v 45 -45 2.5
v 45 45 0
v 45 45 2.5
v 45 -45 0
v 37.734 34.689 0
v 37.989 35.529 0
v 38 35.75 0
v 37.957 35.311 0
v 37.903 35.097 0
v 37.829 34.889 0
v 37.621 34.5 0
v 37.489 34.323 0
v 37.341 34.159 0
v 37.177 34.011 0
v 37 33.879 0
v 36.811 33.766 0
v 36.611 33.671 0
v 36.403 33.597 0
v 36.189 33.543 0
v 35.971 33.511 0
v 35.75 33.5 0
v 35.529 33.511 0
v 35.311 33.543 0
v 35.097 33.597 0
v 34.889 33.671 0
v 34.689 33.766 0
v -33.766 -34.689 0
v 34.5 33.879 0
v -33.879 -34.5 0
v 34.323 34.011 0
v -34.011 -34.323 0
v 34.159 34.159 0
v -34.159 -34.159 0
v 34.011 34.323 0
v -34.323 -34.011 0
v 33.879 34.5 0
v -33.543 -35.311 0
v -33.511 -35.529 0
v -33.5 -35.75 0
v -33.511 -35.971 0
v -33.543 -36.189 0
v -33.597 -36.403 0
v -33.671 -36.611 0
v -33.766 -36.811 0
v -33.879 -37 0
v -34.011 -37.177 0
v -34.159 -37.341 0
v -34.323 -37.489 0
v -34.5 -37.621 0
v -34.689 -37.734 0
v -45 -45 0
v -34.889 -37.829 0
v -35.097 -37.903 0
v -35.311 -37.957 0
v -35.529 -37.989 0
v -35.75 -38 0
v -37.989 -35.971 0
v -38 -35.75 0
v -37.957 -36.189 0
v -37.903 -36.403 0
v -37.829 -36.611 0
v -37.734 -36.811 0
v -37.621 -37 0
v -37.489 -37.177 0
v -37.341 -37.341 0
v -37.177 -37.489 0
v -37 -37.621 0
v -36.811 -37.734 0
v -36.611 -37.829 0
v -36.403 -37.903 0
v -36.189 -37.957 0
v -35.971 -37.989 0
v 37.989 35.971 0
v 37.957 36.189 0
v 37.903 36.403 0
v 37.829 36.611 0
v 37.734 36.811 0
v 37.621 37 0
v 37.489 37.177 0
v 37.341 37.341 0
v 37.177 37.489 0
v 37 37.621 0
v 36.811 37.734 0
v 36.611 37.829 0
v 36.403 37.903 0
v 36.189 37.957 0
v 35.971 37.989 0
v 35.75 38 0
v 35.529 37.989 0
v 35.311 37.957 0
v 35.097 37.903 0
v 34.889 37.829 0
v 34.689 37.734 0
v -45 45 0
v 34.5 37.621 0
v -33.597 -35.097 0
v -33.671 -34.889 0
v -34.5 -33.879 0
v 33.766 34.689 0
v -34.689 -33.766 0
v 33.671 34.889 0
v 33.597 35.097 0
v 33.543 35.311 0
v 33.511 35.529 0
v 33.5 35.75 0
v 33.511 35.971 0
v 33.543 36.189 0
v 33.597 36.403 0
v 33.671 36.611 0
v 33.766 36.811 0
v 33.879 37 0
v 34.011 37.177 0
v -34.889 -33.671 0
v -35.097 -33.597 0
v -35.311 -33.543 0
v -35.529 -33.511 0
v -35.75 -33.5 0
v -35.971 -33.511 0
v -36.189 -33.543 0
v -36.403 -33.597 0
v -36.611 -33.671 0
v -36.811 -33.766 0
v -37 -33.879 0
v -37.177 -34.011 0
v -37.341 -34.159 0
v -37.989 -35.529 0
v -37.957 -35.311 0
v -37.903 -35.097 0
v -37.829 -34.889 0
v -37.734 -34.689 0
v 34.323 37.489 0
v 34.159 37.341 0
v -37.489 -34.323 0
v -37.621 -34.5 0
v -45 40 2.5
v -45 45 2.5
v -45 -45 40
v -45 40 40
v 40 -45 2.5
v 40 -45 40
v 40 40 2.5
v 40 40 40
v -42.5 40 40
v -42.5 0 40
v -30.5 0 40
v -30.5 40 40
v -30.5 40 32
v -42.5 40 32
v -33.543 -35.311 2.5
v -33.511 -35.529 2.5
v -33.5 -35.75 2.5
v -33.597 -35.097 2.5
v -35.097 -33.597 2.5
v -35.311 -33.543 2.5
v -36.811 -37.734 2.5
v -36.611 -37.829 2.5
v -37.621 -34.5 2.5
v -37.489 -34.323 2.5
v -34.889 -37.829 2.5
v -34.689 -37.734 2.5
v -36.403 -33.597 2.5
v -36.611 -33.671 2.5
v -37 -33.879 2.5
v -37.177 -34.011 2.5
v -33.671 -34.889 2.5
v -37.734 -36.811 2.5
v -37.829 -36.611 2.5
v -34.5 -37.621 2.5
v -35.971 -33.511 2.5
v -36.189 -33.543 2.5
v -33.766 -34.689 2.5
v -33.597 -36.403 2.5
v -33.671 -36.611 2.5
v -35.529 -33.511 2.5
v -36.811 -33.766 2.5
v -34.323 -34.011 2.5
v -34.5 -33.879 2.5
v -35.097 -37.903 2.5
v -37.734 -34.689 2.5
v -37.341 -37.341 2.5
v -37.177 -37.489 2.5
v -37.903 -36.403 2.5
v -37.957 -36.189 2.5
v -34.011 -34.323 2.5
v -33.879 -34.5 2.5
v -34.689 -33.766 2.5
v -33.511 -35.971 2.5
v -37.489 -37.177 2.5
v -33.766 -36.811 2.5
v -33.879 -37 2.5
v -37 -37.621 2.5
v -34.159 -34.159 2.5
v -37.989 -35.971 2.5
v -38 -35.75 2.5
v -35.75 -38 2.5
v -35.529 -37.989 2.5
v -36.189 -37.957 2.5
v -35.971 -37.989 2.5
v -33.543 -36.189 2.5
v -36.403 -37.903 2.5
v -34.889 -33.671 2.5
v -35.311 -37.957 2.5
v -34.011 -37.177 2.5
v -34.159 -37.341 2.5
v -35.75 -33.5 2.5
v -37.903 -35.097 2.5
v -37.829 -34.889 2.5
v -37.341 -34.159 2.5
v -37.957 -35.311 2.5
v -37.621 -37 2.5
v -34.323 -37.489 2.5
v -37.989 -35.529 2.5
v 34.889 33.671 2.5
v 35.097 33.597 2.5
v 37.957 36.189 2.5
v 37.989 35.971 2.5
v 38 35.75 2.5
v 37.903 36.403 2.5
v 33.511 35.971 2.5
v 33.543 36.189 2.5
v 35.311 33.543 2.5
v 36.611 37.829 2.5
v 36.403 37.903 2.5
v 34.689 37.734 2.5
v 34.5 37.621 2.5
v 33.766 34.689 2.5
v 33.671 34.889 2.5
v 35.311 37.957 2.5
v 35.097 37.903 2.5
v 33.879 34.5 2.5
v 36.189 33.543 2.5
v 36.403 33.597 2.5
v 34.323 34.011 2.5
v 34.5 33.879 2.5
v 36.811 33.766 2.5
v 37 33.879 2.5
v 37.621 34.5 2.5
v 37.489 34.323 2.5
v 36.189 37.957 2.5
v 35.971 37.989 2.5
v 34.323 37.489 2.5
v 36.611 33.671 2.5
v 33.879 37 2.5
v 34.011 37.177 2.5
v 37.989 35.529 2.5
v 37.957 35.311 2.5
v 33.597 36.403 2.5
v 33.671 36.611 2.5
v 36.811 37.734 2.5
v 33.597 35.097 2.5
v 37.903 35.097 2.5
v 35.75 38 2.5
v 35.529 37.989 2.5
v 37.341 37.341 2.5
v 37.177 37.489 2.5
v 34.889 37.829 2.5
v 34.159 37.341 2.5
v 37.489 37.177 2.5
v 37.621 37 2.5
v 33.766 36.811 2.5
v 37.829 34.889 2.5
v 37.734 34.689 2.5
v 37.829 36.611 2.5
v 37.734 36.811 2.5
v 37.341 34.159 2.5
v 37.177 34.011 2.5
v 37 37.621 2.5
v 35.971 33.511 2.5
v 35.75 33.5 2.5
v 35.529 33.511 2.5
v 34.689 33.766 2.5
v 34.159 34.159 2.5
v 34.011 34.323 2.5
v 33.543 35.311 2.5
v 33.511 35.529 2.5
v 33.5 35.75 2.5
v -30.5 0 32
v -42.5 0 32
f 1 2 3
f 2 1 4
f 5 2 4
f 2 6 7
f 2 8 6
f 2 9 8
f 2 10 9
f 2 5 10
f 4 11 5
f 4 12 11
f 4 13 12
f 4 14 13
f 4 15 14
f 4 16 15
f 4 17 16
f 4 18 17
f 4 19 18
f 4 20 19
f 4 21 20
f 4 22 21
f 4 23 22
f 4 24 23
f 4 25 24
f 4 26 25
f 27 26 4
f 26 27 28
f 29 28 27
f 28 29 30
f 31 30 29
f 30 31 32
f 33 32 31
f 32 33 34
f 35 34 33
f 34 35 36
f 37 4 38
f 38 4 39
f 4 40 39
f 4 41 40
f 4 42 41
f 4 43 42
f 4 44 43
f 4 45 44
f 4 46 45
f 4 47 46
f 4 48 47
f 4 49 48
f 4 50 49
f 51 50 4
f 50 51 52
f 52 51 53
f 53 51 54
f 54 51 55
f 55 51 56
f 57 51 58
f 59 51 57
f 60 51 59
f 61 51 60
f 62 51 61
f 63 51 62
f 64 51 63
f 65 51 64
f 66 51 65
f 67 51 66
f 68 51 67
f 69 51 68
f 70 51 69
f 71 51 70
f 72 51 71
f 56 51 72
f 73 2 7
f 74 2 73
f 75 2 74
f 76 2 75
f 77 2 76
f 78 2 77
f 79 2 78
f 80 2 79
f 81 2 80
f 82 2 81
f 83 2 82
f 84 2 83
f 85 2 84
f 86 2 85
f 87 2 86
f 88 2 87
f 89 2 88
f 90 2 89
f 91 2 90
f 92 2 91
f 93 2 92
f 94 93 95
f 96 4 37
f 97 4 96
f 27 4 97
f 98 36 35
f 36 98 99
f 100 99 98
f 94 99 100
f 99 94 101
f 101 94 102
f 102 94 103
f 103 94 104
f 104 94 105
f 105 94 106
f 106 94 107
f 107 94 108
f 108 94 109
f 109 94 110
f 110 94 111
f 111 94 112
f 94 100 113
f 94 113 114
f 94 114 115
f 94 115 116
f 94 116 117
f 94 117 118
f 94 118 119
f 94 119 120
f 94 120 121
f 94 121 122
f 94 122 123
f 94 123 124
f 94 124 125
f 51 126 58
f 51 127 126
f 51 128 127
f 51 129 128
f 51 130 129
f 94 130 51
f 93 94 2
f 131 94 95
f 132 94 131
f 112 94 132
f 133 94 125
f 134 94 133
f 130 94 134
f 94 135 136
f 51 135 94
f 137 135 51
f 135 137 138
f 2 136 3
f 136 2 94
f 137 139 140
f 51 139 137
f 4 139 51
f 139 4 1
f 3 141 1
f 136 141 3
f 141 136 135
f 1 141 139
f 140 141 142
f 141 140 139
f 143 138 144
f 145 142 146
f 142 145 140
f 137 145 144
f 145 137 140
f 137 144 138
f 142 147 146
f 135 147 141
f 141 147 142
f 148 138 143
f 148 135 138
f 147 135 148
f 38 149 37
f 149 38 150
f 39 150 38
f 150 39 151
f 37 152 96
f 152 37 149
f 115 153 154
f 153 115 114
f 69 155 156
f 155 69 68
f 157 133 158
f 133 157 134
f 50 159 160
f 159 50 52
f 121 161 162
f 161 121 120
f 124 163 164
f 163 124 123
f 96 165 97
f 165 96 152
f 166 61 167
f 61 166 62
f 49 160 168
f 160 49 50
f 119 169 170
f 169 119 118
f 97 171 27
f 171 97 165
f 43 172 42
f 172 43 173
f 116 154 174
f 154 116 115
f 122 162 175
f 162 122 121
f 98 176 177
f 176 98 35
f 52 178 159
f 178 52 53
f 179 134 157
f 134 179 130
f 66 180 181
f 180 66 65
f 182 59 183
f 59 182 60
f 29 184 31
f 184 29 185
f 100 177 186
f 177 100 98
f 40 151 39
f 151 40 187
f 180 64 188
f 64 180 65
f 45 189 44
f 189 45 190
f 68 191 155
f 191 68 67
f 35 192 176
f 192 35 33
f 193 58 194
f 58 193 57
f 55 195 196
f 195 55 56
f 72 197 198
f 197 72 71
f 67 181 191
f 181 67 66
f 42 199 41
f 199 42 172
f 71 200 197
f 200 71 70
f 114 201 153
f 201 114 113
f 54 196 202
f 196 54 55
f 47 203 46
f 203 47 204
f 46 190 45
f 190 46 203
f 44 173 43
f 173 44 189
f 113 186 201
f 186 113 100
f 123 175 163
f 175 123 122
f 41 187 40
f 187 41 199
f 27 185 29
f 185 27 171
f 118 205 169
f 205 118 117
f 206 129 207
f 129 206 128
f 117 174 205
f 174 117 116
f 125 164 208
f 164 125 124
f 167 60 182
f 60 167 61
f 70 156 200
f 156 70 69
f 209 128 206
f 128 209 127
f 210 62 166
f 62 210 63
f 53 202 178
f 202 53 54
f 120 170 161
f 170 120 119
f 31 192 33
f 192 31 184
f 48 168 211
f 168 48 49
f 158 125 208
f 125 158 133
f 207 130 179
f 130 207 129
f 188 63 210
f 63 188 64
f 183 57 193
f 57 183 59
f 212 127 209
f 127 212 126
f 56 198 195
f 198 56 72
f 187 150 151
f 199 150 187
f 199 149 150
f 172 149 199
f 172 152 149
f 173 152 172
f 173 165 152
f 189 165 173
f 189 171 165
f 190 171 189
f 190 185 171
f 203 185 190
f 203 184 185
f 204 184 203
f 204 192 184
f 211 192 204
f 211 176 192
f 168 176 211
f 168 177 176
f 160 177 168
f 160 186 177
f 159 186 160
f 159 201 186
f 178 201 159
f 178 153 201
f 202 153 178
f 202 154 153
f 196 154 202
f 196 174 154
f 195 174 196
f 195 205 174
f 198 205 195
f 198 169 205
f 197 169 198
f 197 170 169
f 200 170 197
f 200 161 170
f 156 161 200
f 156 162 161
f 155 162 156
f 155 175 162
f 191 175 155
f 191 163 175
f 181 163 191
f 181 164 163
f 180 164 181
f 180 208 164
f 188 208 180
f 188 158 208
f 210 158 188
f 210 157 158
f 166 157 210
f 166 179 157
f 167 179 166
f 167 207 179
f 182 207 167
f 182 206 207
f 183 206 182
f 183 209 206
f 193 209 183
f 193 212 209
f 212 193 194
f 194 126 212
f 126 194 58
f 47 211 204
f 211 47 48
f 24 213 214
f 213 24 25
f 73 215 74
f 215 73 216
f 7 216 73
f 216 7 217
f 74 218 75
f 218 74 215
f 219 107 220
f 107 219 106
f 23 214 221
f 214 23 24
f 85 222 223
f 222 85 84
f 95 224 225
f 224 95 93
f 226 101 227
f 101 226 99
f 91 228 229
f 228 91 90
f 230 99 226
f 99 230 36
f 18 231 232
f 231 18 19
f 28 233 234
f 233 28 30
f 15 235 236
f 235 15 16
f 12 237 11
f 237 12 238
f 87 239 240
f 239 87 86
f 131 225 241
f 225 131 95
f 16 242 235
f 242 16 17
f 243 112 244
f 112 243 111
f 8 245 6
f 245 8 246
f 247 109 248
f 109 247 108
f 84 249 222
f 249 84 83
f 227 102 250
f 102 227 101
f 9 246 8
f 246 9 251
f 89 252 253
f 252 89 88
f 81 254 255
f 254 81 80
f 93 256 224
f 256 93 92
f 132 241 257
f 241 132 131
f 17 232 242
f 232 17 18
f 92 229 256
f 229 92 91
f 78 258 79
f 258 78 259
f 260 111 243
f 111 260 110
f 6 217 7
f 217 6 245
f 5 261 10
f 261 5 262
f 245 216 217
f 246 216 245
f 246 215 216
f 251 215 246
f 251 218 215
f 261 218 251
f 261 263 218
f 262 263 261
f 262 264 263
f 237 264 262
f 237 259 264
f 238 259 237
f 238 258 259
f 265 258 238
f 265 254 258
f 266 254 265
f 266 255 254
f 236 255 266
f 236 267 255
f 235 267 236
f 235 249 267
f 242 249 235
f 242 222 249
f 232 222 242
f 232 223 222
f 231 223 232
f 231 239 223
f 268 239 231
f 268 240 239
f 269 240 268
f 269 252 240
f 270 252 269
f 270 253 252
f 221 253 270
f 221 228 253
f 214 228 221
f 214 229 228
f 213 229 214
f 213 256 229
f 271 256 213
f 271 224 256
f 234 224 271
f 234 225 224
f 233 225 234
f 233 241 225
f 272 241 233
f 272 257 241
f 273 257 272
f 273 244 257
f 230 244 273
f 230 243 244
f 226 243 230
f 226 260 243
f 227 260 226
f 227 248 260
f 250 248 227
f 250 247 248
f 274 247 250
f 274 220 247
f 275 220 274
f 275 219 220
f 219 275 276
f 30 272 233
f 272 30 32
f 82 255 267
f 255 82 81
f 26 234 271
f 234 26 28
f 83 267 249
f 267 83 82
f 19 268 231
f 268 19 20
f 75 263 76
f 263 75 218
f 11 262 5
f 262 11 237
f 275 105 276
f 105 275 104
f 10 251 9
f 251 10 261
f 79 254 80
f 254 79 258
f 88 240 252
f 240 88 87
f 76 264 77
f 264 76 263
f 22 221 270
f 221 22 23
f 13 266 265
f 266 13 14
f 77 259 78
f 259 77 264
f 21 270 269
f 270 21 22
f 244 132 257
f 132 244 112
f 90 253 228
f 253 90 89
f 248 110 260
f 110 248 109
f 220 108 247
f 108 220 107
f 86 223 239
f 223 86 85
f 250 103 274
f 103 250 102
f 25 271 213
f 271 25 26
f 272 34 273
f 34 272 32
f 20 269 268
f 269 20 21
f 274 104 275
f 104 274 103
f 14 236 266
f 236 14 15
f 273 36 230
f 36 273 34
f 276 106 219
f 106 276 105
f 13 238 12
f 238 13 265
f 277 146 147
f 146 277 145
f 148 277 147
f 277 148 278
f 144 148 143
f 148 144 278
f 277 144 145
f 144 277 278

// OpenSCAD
// DIY magnetic stirrer housing for 80 mm PC case fan
// Print orientation: top plate on bed (z = 0), walls build upward (+Z)

// ---------------- Parameters ----------------
outer_size   = 90;    // outer size of top plate and box (X x Y), mm
plate_thick  = 2;     // top plate thickness, mm (z = 0 to 2)
wall_thick   = 2.5;   // wall thickness, mm (z = 2 to 40)
box_height   = 40;    // total height of box from bed, mm
hole_d       = 4.5;   // screw holes diameter (M4), mm
hole_count   = 4;     // number of screw holes
hole_pitch   = 71.5;  // square pattern pitch for screw holes, mm
notch_w      = 12;    // power cable notch width, mm
notch_depth  = 8;     // power cable notch depth from open edge, mm
eps          = 0.5;   // cutter overshoot past faces, mm

$fn = 64;

// ---------------- Derived ----------------
inner_x = outer_size - 2 * wall_thick;   // inner opening width (X)
inner_y = outer_size - 2 * wall_thick;   // inner opening depth (Y)
notch_z0 = box_height - notch_depth;    // notch bottom height (z = 32)

// ---------------- Model ----------------
difference() {
    union() {
        // Top plate
        translate([-outer_size / 2, -outer_size / 2, 0])
            cube([outer_size, outer_size, plate_thick]);

        // Walls (hollow, open top)
        translate([-outer_size / 2, -outer_size / 2, 0])
            cube([outer_size, outer_size, wall_thick]);
        translate([-outer_size / 2, -outer_size / 2, plate_thick - 0.01])
            cube([inner_x, inner_y, box_height - plate_thick + 0.01]);
    }

    // Screw holes through top plate on 71.5 mm square pattern
    for (i = [0 : hole_count - 1]) {
        x = (i - (hole_count - 1) / 2) * hole_pitch;
        translate([x, x, -eps])
            cylinder(d = hole_d, h = plate_thick + 2 * eps);
    }

    // Power cable notch in one wall, centred along the wall
    translate([-inner_x / 2, 0, notch_z0])
        cube([notch_w, outer_size, notch_depth + eps]);
}
